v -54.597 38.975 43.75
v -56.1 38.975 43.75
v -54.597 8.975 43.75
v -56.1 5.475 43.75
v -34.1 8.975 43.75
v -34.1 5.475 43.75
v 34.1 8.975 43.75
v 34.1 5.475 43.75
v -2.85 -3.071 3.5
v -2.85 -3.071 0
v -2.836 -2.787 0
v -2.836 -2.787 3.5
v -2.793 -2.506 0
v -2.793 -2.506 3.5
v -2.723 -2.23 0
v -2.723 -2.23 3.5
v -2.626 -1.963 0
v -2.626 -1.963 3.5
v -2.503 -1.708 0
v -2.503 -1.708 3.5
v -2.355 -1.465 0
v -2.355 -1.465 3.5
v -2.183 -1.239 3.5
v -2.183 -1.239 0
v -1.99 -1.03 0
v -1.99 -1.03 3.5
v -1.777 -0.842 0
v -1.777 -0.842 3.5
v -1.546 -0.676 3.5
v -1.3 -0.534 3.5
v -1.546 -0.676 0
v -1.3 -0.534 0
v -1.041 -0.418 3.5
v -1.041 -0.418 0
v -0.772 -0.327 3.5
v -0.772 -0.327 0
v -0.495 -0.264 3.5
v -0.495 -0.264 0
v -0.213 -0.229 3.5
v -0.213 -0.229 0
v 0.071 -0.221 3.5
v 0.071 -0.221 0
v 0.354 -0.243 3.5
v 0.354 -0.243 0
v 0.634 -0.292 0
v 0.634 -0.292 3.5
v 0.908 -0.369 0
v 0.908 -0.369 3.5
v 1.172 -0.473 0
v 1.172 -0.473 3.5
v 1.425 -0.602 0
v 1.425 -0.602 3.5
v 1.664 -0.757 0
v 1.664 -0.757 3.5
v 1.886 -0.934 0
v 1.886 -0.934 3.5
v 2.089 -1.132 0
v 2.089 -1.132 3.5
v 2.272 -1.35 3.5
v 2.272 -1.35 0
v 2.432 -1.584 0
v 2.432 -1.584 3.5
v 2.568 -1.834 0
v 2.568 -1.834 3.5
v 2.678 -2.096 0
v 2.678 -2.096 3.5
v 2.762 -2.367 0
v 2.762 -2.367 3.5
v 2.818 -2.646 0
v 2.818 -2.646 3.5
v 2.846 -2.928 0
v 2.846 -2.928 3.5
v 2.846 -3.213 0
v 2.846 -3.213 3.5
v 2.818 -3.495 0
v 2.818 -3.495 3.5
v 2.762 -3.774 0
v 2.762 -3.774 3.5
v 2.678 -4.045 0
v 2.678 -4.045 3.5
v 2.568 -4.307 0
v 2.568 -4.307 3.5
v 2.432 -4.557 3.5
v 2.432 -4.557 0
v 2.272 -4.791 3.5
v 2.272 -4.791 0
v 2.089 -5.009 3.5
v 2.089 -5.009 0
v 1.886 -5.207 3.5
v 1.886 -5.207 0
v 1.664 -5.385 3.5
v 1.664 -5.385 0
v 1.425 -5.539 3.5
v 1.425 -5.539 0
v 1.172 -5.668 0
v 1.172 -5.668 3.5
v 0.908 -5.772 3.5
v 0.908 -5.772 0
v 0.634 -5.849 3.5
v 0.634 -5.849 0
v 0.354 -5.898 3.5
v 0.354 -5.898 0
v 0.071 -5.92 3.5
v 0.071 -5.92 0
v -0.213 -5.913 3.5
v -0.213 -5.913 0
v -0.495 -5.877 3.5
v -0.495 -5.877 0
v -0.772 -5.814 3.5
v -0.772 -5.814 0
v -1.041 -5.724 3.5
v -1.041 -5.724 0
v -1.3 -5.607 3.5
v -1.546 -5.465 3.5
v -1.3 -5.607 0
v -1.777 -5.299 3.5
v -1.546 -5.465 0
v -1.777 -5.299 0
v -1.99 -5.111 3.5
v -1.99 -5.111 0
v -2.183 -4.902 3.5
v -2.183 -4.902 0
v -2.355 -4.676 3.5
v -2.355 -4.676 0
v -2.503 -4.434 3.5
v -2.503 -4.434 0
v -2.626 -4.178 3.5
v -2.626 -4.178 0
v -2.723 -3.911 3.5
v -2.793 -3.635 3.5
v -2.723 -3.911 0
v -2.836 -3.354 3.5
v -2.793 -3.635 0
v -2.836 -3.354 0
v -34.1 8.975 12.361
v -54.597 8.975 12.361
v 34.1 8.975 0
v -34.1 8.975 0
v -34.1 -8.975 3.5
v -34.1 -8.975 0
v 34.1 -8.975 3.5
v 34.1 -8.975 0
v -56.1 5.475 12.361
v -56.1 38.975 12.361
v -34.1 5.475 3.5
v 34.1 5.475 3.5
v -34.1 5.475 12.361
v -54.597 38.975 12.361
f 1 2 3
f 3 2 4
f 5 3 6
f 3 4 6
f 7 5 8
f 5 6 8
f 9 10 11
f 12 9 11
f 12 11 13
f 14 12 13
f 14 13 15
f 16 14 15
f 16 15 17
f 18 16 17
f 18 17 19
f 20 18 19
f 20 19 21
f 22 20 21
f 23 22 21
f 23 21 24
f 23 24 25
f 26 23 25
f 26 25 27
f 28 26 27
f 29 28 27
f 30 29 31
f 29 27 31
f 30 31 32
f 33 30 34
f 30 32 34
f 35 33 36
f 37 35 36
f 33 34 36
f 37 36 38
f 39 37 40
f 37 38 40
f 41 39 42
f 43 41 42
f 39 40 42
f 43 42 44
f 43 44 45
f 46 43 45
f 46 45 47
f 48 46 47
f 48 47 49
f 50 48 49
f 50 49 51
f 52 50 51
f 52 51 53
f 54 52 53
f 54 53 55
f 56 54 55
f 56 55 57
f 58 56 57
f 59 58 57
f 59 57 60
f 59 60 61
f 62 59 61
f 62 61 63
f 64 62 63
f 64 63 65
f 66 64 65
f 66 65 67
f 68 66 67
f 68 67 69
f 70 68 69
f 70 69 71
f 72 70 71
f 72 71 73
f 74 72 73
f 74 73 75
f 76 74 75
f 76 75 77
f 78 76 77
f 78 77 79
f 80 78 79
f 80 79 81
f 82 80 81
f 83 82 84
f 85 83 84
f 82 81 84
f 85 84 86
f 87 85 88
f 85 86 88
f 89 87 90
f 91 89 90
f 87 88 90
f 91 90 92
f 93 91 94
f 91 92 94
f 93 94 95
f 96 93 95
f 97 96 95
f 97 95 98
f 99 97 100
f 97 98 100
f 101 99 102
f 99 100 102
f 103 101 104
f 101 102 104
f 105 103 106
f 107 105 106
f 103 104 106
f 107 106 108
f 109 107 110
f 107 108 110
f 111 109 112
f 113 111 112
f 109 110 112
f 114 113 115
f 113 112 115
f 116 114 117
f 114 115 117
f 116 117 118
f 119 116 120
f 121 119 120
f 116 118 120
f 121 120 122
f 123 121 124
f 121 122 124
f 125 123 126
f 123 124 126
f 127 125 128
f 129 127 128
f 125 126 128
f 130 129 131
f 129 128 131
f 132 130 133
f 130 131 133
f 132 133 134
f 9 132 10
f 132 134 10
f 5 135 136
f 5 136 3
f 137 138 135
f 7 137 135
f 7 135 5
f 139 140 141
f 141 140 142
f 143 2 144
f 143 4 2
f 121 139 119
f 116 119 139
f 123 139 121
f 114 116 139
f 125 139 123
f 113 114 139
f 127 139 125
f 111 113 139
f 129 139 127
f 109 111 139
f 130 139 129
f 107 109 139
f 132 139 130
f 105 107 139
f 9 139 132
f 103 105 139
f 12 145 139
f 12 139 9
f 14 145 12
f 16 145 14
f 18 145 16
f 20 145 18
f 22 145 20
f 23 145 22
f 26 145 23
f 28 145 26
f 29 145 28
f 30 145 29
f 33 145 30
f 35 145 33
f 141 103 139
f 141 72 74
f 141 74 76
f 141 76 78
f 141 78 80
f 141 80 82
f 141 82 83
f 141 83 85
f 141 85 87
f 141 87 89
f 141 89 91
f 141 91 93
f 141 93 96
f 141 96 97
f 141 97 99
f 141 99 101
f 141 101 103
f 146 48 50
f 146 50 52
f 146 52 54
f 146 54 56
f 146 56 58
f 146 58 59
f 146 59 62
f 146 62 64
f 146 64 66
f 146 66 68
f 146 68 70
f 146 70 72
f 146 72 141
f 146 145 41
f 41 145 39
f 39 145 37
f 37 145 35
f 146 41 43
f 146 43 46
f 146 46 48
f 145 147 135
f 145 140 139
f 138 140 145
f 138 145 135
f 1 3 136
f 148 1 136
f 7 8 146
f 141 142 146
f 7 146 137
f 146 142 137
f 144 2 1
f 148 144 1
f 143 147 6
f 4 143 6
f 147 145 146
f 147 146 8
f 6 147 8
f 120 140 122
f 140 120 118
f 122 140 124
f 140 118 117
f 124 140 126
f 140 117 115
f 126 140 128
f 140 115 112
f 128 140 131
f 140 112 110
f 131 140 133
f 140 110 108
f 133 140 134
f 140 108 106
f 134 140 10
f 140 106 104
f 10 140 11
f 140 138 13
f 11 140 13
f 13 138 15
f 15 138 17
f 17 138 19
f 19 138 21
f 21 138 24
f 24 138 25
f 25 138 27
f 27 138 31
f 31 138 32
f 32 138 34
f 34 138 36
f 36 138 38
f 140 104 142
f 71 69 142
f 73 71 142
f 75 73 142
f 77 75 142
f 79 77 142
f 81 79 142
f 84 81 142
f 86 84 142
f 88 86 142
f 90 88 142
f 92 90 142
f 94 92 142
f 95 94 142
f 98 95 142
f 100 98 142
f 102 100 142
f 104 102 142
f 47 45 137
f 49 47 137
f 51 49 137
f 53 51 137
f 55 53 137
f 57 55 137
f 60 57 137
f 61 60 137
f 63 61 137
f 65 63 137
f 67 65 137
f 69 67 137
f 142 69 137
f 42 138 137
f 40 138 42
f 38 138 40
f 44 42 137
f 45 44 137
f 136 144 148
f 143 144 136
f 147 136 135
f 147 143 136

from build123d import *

# Parameters (mm, degrees)
SKETCH_1_W          = 68.2
SKETCH_1_H          = 17.95
EXTRUDE_1_DEPTH     = 3.5
SKETCH_21_W         = 68.2
SKETCH_21_H         = 3.5
EXTRUDE_4_DEPTH     = 28.25
SKETCH_24_R         = 2.85
CUT_EXTRUDE_2_DEPTH = 28.25
SKETCH_30_W         = 68.2
SKETCH_30_H         = 3.5
EXTRUDE_6_DEPTH     = 12
SKETCH_31_W         = 31.388626345
SKETCH_31_H         = 3.5
EXTRUDE_7_DEPTH     = 22
SKETCH_32_W         = 1.503469792
SKETCH_32_H         = 31.388626345
EXTRUDE_8_DEPTH     = 30


with BuildPart() as part:
    # 草圖1 → 1 (new body)
    with BuildSketch(Plane.XY):
        Rectangle(SKETCH_1_W, SKETCH_1_H)
    extrude(amount=EXTRUDE_1_DEPTH)

    # 草圖21 → 填料-伸長4 (add)
    with BuildSketch(Plane.XY.offset(3.5)):
        with Locations((0, 7.225)):
            Rectangle(SKETCH_21_W, SKETCH_21_H)
    extrude(amount=EXTRUDE_4_DEPTH)

    # 草圖24 → 除料-伸長2 (cut)
    with BuildSketch(Plane(origin=(0, 0, 0), x_dir=(-1, 0, 0), z_dir=(0, 0, -1))):
        with Locations((0, -3.070533486)):
            Circle(SKETCH_24_R)
    extrude(amount=-CUT_EXTRUDE_2_DEPTH, mode=Mode.SUBTRACT)

    # 草圖30 → 填料-伸長6 (add)
    with BuildSketch(Plane.XY.offset(31.75)):
        with Locations((0, 7.225)):
            Rectangle(SKETCH_30_W, SKETCH_30_H)
    extrude(amount=EXTRUDE_6_DEPTH)

    # 草圖31 → 填料-伸長7 (add)
    with BuildSketch(Plane.ZY.offset(34.1)):
        with Locations((28.055686828, 7.225)):
            Rectangle(SKETCH_31_W, SKETCH_31_H)
    extrude(amount=EXTRUDE_7_DEPTH)

    # 草圖32 → 填料-伸長8 (add)
    with BuildSketch(Plane(origin=(0, 8.975, 0), x_dir=(1, 0, 0), z_dir=(0, 1, 0))):
        with Locations((-55.348265104, -28.055686828)):
            Rectangle(SKETCH_32_W, SKETCH_32_H)
    extrude(amount=EXTRUDE_8_DEPTH)


solid = part.part
